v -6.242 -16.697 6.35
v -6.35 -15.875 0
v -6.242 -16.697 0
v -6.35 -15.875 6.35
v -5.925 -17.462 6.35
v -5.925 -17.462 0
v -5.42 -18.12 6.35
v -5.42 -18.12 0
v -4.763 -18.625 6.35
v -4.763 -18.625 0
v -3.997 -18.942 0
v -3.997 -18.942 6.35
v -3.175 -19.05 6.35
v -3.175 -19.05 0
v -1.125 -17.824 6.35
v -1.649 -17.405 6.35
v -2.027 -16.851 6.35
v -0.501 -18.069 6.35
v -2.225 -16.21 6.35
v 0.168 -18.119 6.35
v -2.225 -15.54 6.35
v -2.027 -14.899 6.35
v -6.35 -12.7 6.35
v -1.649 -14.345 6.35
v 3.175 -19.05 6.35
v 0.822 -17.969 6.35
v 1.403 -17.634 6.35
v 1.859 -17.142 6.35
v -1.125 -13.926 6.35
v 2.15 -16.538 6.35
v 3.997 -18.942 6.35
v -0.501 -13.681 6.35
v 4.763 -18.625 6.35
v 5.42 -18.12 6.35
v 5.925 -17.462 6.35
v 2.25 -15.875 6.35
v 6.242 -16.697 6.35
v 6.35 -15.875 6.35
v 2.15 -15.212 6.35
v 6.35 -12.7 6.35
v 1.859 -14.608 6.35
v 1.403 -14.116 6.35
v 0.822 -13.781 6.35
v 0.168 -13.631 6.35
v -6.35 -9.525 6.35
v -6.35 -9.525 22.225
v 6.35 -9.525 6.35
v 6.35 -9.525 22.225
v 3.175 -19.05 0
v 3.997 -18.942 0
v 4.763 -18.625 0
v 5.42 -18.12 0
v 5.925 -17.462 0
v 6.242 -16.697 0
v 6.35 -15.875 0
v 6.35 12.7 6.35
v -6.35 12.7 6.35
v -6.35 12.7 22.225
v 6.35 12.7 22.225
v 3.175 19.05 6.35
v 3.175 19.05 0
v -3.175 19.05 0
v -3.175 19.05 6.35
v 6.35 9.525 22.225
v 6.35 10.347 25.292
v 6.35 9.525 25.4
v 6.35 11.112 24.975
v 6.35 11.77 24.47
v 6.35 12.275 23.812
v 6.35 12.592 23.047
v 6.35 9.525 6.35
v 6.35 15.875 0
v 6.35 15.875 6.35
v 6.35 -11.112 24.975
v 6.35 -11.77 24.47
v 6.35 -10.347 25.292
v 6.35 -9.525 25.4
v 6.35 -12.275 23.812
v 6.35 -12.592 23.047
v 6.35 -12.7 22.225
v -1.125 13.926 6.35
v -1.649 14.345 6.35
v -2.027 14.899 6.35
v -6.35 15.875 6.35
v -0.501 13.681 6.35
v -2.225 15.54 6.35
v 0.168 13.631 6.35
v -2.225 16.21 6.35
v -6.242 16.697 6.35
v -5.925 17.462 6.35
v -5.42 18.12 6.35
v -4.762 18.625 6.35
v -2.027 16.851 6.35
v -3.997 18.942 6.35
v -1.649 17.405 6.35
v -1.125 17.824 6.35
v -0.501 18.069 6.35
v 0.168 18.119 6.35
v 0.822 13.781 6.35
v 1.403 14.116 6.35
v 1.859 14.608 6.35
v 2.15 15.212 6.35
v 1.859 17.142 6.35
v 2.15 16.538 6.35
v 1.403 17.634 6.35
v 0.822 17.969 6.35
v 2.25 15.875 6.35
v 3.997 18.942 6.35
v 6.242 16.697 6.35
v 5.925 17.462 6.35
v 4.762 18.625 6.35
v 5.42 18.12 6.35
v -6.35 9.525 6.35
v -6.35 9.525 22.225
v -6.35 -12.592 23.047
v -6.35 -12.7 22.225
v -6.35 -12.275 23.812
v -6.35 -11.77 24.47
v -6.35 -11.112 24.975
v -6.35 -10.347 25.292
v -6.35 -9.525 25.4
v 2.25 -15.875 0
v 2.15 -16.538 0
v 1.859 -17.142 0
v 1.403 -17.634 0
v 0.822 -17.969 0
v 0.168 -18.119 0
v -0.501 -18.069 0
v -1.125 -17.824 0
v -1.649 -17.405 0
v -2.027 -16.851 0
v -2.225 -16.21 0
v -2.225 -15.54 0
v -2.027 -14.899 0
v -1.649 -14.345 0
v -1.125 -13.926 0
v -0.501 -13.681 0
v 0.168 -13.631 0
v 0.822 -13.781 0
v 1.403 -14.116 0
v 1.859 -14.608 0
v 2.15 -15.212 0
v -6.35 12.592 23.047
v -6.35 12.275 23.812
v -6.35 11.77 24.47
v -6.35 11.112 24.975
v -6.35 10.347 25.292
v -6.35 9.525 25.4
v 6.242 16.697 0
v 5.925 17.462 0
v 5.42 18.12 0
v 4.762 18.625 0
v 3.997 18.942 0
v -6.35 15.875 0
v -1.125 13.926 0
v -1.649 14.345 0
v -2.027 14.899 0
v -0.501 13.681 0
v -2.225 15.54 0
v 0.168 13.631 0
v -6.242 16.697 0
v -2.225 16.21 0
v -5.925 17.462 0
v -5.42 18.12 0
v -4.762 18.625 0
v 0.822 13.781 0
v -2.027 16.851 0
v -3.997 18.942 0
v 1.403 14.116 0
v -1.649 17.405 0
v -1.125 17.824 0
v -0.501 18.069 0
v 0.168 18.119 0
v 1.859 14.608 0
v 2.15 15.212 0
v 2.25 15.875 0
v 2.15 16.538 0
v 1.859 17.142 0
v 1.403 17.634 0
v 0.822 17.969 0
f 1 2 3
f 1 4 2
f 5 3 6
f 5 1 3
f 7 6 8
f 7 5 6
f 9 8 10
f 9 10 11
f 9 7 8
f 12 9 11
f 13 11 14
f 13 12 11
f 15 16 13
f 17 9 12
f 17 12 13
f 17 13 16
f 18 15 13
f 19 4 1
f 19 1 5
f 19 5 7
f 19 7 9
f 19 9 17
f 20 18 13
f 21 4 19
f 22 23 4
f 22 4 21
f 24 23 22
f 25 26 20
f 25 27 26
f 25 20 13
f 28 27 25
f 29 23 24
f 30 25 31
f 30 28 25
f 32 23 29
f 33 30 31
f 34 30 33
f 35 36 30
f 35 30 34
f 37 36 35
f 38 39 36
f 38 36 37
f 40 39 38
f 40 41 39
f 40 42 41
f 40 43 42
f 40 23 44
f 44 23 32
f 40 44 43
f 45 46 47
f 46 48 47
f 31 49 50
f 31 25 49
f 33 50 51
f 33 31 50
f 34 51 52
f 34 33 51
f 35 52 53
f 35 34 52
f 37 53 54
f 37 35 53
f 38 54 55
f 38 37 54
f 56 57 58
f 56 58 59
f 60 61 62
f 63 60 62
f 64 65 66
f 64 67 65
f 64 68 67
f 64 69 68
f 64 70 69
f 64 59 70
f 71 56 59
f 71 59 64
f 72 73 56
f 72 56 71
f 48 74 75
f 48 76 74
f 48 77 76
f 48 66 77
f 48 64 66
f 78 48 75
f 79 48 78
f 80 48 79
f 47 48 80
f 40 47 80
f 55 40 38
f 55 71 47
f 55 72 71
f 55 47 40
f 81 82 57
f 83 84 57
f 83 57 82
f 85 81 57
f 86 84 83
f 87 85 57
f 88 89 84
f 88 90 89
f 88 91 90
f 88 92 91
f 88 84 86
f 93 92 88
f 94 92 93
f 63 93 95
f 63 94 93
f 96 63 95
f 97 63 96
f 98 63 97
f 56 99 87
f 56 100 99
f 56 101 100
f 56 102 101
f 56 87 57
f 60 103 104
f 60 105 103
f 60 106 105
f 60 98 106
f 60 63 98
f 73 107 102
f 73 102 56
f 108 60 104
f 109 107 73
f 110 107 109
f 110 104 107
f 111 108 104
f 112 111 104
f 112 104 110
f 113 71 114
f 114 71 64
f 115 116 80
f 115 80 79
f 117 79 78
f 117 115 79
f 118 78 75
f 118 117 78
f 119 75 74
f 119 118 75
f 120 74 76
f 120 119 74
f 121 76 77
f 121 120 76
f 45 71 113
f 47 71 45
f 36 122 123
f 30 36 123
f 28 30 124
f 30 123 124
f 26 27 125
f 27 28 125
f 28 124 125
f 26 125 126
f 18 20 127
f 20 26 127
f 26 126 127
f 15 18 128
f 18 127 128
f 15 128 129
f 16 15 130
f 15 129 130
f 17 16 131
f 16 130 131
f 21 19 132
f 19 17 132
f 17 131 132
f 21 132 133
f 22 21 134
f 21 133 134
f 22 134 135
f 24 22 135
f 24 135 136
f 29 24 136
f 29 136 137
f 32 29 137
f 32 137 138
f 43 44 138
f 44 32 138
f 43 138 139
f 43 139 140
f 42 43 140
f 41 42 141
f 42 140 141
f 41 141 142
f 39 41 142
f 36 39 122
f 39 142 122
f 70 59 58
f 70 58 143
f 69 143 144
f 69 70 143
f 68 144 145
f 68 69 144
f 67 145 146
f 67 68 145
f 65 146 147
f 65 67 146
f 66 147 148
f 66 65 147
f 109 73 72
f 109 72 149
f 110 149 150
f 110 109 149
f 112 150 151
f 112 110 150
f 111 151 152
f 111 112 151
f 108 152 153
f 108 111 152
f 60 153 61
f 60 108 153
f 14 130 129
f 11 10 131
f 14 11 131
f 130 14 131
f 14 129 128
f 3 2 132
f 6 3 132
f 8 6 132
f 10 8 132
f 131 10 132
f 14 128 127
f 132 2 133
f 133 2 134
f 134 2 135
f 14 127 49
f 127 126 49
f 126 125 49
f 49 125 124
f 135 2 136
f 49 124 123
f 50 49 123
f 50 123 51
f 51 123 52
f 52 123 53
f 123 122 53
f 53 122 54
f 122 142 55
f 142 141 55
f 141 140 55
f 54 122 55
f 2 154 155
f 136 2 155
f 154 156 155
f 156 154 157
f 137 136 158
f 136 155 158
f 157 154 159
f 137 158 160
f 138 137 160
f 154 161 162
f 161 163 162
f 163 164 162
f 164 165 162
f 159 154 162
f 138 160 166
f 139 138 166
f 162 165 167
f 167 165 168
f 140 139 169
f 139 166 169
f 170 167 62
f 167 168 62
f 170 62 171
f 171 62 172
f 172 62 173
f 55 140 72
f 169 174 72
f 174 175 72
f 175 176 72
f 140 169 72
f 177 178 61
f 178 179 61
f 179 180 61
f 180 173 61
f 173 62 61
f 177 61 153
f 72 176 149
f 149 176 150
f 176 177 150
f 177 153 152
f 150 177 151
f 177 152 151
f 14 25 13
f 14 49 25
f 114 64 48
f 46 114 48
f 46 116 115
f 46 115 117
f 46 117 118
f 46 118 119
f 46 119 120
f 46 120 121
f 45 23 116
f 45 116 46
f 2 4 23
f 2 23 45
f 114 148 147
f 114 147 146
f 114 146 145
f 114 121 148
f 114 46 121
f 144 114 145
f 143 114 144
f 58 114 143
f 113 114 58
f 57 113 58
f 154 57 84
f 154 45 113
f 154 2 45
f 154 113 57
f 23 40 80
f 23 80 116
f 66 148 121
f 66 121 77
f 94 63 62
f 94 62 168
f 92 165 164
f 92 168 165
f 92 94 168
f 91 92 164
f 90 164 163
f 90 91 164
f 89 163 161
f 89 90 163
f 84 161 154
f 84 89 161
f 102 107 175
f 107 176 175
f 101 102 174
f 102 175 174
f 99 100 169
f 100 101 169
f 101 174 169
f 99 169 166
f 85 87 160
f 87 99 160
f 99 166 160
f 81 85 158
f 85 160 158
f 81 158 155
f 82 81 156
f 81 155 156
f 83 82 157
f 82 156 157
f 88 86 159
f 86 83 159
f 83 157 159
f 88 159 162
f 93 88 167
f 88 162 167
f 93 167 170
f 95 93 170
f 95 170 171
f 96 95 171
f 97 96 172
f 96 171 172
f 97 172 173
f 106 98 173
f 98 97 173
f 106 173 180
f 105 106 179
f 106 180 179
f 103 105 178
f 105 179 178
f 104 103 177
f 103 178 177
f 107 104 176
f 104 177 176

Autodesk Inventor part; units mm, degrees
ref_plane "YZ Plane" through (0, 0, 0) normal (1, 0, 0) x (0, 1, 0)
ref_plane "XZ Plane" through (0, 0, 0) normal (0, 1, 0) x (-1, 0, 0)
ref_plane "XY Plane" through (0, 0, 0) normal (0, 0, 1) x (1, 0, 0)
sketch "Sketch1" plane through (0, 0, 0) normal (0, 0, 1) x (1, 0, 0)
  line L0 (6.35, -12.7) -> (-6.35, -12.7)
  line L1 (-6.35, -12.7) -> (-6.35, 12.7)
  line L2 (-6.35, 12.7) -> (6.35, 12.7)
  line L3 (6.35, 12.7) -> (6.35, -12.7)
  line L4 (6.35, -12.7) -> (-6.35, 12.7) construction
  line L5 (-6.35, -12.7) -> (6.35, 12.7) construction
  line L6 (-6.35, 12.7) -> (6.35, 12.7)
  line L7 (6.35, 12.7) -> (6.35, 19.05)
  line L8 (6.35, 19.05) -> (-6.35, 19.05)
  line L9 (-6.35, 19.05) -> (-6.35, 12.7)
  line L10 (-6.35, -12.7) -> (6.35, -12.7)
  line L11 (6.35, -12.7) -> (6.35, -19.05)
  line L12 (6.35, -19.05) -> (-6.35, -19.05)
  line L13 (-6.35, -19.05) -> (-6.35, -12.7)
  circle A0 centre (0, 15.875) radius 2.25
  circle A1 centre (0, -15.875) radius 2.25
  point P0 (0, 0)
  dimension "d0" = 12.7
  dimension "d1" = 25.4
  dimension "d2" = 6.35
  dimension "d3" = 6.35
  dimension "d4" = 4.5
  dimension "d5" = 4.5
extrude "Extrusion1" add sketch "Sketch1" along normal blind 6.35 contours L11 L12 L13 L0 | L2 L9 L8 L7
extrude "Extrusion2" add sketch "Sketch1" along normal blind 25.4 contours L0 L1 L2 L3
sketch "Sketch2" plane through (6.35, -19.05, 0) normal (1, 0, 0) x (0, 0, -1)
  line L0 (0, 0) -> (0, 38.1) projected
  line L1 (0, 38.1) -> (-6.35, 38.1) projected
  line L2 (-6.35, 31.75) -> (-6.35, 38.1) projected
  line L3 (-6.35, 31.75) -> (-25.4, 31.75) projected
  line L4 (-25.4, 6.35) -> (-25.4, 31.75) projected
  line L5 (-6.35, 6.35) -> (-25.4, 6.35) projected
  line L6 (-6.35, 0) -> (-6.35, 6.35) projected
  line L7 (0, 0) -> (-6.35, 0) projected
  line L8 (-6.35, 38.1) -> (-6.35, 31.75) projected
  line L9 (-6.35, 6.35) -> (-6.35, 0) projected
  line L10 (-6.35, 31.75) -> (-6.35, 6.35)
  line L11 (-6.35, 28.575) -> (-22.225, 28.575)
  line L12 (-22.225, 28.575) -> (-22.225, 9.525)
  line L13 (-22.225, 9.525) -> (-6.35, 9.525)
  point P0 (0, 19.05)
  dimension "d10" = 3.175
extrude "Extrusion3" cut sketch "Sketch2" against normal through all contours L13 L12 L11 L10
fillet "Fillet1" radius 3.175 6 edges at (-6.35, 19.05, 3.175) (6.35, 19.05, 3.175) (0, 12.7, 25.4) (0, -12.7, 25.4) (6.35, -19.05, 3.175) (-6.35, -19.05, 3.175)
properties part number "Latch_For_Climb_And_Drone"
